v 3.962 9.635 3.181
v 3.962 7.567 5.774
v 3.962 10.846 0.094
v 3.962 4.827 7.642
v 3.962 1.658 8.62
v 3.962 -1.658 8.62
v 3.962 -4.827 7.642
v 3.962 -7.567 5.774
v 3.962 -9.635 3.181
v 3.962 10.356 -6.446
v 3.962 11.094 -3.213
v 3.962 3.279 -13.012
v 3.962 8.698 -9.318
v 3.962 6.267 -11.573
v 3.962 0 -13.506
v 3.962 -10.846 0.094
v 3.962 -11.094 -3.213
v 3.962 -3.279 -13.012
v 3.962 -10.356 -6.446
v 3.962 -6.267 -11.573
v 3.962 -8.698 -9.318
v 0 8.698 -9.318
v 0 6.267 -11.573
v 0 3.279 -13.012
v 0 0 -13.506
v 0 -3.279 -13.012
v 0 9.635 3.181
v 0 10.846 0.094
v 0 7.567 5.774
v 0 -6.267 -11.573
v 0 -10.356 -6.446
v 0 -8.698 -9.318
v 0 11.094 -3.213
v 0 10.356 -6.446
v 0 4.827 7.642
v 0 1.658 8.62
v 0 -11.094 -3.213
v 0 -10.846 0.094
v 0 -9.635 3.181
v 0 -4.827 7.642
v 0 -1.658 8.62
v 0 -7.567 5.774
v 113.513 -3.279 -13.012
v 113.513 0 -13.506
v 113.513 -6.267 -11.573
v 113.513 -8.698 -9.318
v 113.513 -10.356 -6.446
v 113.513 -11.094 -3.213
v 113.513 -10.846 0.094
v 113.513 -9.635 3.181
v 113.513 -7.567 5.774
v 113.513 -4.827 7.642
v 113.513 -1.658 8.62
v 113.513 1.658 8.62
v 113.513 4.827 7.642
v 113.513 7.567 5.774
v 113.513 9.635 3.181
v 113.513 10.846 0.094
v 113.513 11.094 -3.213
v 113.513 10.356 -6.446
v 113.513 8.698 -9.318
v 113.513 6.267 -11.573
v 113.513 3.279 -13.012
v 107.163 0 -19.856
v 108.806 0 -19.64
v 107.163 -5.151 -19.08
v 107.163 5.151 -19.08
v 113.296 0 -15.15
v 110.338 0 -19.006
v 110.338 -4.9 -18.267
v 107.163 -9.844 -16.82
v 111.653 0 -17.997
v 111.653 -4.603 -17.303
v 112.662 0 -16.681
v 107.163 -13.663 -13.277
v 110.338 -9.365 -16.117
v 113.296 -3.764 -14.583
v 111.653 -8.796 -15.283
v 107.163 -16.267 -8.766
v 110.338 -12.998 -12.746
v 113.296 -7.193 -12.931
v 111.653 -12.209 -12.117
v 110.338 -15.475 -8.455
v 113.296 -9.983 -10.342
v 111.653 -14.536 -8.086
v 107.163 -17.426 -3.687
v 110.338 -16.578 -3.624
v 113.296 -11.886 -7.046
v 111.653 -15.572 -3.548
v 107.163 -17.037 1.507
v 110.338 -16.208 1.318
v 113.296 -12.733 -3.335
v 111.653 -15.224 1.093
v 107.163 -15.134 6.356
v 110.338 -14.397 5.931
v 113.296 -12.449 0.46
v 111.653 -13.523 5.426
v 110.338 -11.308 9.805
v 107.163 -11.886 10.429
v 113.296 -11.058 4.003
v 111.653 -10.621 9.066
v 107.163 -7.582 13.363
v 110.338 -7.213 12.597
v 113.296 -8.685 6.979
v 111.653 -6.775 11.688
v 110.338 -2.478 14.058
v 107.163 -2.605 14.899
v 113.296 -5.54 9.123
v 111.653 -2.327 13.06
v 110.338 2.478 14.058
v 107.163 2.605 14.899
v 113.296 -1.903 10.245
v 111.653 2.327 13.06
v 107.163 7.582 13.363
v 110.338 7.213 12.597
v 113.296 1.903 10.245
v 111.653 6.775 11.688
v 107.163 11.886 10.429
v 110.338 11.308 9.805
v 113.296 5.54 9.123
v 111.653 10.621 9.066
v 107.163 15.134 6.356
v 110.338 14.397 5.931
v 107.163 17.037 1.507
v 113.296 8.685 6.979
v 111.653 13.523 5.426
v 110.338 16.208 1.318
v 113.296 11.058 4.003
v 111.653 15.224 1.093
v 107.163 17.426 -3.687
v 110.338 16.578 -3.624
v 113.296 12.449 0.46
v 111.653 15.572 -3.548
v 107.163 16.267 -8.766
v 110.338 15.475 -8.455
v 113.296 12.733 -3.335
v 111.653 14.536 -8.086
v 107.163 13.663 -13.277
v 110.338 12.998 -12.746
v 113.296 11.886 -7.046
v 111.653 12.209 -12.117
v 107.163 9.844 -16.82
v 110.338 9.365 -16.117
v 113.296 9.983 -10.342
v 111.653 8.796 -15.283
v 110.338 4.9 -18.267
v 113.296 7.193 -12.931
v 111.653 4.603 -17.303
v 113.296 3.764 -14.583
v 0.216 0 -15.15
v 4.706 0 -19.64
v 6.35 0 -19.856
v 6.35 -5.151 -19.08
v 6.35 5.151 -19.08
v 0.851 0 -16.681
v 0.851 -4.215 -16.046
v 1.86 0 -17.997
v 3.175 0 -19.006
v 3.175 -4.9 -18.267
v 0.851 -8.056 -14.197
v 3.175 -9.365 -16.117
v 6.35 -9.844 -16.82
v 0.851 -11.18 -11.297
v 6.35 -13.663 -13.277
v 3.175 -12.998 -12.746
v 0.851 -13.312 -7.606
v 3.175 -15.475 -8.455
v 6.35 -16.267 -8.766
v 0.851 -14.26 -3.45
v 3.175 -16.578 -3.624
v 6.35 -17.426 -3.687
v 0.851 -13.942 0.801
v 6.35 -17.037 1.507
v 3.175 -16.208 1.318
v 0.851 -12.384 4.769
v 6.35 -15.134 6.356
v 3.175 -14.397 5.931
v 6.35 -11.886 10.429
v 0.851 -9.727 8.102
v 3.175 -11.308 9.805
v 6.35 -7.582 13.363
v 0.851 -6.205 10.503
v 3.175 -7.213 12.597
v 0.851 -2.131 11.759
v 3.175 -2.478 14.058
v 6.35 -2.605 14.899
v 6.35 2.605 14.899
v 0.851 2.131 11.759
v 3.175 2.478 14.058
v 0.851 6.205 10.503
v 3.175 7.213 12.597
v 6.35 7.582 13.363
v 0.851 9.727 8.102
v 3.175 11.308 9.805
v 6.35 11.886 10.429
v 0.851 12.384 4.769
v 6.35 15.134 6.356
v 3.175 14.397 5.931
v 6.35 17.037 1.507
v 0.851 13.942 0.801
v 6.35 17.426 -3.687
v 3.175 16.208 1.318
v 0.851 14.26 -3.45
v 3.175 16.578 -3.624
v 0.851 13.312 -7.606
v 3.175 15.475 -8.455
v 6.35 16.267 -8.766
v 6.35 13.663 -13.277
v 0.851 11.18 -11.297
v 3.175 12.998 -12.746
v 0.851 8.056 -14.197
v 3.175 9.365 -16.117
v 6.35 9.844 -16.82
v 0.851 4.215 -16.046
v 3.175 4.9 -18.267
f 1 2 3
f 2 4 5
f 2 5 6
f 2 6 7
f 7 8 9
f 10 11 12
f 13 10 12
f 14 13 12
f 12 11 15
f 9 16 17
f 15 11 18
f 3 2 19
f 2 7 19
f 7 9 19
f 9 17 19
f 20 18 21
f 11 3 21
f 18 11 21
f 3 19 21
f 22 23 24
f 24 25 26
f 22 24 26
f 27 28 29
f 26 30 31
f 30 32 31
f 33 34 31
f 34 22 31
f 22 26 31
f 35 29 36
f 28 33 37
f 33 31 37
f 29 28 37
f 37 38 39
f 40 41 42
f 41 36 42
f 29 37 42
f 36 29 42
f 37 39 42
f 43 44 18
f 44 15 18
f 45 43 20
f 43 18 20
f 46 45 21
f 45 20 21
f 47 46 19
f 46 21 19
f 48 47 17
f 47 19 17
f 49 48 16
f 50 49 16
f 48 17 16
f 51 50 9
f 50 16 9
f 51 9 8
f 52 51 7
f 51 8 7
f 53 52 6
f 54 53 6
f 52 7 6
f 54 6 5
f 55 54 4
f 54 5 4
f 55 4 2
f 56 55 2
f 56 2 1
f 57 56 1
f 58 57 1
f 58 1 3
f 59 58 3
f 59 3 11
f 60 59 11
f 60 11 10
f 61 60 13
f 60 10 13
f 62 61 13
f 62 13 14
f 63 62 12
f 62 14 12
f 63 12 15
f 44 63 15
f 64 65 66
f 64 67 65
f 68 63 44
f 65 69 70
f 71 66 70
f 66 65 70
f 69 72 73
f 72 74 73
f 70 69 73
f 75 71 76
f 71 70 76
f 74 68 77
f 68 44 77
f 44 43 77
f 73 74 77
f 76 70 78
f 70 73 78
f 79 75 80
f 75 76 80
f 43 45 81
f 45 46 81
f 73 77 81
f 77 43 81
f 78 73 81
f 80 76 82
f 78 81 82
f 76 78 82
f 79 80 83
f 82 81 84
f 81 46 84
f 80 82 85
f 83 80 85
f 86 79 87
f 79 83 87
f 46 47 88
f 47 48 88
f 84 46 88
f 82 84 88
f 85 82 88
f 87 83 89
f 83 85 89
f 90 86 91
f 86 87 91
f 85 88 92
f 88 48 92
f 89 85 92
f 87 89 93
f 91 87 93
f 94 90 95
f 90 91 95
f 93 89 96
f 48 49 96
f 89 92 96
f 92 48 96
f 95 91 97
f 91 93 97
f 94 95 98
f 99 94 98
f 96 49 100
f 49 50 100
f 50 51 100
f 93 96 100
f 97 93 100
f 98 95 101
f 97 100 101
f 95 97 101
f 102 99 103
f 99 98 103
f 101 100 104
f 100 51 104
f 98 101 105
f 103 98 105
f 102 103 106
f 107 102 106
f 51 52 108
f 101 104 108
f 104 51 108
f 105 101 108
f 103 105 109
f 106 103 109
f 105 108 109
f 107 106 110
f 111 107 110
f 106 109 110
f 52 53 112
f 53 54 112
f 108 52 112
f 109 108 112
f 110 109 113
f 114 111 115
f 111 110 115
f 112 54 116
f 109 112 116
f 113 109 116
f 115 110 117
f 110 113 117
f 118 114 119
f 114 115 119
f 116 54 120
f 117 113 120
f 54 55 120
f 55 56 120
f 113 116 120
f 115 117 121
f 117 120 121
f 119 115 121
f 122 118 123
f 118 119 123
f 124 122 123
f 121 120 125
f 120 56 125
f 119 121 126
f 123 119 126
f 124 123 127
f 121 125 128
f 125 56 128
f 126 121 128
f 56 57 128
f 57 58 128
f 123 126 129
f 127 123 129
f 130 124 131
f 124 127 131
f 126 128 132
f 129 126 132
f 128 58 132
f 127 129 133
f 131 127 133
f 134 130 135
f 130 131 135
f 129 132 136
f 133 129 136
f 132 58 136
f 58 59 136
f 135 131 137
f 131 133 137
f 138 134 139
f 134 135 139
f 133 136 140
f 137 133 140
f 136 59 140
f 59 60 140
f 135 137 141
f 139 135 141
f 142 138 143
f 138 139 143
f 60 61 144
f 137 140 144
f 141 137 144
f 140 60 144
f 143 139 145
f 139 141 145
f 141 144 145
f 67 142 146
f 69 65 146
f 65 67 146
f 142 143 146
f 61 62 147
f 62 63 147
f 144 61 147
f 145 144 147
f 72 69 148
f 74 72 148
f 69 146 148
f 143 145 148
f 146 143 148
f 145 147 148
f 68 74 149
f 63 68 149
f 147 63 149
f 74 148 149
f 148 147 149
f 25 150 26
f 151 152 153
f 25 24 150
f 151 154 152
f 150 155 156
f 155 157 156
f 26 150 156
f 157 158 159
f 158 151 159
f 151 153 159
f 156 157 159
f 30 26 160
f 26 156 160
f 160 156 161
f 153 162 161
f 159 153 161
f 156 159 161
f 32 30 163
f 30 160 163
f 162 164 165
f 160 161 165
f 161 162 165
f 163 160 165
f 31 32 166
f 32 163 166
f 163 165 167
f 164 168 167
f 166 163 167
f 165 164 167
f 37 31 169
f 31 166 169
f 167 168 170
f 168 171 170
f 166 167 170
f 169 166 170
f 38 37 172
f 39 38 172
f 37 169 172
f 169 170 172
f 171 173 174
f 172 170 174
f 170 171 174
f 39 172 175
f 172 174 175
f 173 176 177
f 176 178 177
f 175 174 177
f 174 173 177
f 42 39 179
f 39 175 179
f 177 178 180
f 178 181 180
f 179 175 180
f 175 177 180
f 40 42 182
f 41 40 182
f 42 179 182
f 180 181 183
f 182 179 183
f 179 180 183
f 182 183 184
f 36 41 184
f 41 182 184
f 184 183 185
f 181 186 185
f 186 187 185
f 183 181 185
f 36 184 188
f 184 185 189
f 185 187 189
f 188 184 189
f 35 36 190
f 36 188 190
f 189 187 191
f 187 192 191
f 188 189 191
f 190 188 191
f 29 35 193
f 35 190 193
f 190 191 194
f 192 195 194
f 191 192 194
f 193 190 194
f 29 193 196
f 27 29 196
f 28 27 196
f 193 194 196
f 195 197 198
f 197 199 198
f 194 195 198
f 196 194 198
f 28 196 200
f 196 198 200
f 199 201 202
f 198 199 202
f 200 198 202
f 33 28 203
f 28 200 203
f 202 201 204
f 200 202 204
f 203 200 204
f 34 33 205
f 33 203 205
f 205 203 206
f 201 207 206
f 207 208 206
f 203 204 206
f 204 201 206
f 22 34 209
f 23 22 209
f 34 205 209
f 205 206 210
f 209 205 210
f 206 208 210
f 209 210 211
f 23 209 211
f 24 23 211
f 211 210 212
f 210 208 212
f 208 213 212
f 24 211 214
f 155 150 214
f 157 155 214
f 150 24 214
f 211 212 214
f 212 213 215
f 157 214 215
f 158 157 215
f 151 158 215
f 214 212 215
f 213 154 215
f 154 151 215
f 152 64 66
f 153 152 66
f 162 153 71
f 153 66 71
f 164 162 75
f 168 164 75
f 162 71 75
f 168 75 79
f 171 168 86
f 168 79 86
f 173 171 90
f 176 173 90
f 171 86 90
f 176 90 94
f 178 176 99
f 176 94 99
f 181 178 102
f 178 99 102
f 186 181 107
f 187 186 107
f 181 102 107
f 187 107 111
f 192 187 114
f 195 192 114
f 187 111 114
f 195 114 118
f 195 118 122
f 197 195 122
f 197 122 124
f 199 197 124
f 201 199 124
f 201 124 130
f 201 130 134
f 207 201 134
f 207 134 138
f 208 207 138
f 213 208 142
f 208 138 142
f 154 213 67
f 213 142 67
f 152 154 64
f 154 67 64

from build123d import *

# Parameters (mm, degrees)
F2_R = 6.34999


# Not quite as in the source:
# - a fillet or chamfer is up to 0.001 mm smaller than in the source, because OpenCascade refuses the exact size


with BuildPart() as f1:
    # F0 (on Front) → F1 (revolve)
    with BuildSketch(Plane.XZ):
        Polygon((3.9624, -2.38125), (0, -2.38125), (0, -19.85645), (113.5126, -19.85645), (113.5126, -13.50645), (3.9624, -13.50645), align=None)
    revolve(axis=Axis((1.9812, 0, -2.38125), (-1, 0, 0)))

    # F2 (radius 6.35 in the source; OpenCascade refuses exactly that, so slightly less here)
    f2_edges = [f1.edges().sort_by_distance(p)[0] for p in [
        (0, 0, 15.09395),
        (113.5126, 0, 15.09395),
        (56.7563, 0, -19.85645),
    ]]
    fillet(f2_edges, radius=F2_R)


solid = f1.part
